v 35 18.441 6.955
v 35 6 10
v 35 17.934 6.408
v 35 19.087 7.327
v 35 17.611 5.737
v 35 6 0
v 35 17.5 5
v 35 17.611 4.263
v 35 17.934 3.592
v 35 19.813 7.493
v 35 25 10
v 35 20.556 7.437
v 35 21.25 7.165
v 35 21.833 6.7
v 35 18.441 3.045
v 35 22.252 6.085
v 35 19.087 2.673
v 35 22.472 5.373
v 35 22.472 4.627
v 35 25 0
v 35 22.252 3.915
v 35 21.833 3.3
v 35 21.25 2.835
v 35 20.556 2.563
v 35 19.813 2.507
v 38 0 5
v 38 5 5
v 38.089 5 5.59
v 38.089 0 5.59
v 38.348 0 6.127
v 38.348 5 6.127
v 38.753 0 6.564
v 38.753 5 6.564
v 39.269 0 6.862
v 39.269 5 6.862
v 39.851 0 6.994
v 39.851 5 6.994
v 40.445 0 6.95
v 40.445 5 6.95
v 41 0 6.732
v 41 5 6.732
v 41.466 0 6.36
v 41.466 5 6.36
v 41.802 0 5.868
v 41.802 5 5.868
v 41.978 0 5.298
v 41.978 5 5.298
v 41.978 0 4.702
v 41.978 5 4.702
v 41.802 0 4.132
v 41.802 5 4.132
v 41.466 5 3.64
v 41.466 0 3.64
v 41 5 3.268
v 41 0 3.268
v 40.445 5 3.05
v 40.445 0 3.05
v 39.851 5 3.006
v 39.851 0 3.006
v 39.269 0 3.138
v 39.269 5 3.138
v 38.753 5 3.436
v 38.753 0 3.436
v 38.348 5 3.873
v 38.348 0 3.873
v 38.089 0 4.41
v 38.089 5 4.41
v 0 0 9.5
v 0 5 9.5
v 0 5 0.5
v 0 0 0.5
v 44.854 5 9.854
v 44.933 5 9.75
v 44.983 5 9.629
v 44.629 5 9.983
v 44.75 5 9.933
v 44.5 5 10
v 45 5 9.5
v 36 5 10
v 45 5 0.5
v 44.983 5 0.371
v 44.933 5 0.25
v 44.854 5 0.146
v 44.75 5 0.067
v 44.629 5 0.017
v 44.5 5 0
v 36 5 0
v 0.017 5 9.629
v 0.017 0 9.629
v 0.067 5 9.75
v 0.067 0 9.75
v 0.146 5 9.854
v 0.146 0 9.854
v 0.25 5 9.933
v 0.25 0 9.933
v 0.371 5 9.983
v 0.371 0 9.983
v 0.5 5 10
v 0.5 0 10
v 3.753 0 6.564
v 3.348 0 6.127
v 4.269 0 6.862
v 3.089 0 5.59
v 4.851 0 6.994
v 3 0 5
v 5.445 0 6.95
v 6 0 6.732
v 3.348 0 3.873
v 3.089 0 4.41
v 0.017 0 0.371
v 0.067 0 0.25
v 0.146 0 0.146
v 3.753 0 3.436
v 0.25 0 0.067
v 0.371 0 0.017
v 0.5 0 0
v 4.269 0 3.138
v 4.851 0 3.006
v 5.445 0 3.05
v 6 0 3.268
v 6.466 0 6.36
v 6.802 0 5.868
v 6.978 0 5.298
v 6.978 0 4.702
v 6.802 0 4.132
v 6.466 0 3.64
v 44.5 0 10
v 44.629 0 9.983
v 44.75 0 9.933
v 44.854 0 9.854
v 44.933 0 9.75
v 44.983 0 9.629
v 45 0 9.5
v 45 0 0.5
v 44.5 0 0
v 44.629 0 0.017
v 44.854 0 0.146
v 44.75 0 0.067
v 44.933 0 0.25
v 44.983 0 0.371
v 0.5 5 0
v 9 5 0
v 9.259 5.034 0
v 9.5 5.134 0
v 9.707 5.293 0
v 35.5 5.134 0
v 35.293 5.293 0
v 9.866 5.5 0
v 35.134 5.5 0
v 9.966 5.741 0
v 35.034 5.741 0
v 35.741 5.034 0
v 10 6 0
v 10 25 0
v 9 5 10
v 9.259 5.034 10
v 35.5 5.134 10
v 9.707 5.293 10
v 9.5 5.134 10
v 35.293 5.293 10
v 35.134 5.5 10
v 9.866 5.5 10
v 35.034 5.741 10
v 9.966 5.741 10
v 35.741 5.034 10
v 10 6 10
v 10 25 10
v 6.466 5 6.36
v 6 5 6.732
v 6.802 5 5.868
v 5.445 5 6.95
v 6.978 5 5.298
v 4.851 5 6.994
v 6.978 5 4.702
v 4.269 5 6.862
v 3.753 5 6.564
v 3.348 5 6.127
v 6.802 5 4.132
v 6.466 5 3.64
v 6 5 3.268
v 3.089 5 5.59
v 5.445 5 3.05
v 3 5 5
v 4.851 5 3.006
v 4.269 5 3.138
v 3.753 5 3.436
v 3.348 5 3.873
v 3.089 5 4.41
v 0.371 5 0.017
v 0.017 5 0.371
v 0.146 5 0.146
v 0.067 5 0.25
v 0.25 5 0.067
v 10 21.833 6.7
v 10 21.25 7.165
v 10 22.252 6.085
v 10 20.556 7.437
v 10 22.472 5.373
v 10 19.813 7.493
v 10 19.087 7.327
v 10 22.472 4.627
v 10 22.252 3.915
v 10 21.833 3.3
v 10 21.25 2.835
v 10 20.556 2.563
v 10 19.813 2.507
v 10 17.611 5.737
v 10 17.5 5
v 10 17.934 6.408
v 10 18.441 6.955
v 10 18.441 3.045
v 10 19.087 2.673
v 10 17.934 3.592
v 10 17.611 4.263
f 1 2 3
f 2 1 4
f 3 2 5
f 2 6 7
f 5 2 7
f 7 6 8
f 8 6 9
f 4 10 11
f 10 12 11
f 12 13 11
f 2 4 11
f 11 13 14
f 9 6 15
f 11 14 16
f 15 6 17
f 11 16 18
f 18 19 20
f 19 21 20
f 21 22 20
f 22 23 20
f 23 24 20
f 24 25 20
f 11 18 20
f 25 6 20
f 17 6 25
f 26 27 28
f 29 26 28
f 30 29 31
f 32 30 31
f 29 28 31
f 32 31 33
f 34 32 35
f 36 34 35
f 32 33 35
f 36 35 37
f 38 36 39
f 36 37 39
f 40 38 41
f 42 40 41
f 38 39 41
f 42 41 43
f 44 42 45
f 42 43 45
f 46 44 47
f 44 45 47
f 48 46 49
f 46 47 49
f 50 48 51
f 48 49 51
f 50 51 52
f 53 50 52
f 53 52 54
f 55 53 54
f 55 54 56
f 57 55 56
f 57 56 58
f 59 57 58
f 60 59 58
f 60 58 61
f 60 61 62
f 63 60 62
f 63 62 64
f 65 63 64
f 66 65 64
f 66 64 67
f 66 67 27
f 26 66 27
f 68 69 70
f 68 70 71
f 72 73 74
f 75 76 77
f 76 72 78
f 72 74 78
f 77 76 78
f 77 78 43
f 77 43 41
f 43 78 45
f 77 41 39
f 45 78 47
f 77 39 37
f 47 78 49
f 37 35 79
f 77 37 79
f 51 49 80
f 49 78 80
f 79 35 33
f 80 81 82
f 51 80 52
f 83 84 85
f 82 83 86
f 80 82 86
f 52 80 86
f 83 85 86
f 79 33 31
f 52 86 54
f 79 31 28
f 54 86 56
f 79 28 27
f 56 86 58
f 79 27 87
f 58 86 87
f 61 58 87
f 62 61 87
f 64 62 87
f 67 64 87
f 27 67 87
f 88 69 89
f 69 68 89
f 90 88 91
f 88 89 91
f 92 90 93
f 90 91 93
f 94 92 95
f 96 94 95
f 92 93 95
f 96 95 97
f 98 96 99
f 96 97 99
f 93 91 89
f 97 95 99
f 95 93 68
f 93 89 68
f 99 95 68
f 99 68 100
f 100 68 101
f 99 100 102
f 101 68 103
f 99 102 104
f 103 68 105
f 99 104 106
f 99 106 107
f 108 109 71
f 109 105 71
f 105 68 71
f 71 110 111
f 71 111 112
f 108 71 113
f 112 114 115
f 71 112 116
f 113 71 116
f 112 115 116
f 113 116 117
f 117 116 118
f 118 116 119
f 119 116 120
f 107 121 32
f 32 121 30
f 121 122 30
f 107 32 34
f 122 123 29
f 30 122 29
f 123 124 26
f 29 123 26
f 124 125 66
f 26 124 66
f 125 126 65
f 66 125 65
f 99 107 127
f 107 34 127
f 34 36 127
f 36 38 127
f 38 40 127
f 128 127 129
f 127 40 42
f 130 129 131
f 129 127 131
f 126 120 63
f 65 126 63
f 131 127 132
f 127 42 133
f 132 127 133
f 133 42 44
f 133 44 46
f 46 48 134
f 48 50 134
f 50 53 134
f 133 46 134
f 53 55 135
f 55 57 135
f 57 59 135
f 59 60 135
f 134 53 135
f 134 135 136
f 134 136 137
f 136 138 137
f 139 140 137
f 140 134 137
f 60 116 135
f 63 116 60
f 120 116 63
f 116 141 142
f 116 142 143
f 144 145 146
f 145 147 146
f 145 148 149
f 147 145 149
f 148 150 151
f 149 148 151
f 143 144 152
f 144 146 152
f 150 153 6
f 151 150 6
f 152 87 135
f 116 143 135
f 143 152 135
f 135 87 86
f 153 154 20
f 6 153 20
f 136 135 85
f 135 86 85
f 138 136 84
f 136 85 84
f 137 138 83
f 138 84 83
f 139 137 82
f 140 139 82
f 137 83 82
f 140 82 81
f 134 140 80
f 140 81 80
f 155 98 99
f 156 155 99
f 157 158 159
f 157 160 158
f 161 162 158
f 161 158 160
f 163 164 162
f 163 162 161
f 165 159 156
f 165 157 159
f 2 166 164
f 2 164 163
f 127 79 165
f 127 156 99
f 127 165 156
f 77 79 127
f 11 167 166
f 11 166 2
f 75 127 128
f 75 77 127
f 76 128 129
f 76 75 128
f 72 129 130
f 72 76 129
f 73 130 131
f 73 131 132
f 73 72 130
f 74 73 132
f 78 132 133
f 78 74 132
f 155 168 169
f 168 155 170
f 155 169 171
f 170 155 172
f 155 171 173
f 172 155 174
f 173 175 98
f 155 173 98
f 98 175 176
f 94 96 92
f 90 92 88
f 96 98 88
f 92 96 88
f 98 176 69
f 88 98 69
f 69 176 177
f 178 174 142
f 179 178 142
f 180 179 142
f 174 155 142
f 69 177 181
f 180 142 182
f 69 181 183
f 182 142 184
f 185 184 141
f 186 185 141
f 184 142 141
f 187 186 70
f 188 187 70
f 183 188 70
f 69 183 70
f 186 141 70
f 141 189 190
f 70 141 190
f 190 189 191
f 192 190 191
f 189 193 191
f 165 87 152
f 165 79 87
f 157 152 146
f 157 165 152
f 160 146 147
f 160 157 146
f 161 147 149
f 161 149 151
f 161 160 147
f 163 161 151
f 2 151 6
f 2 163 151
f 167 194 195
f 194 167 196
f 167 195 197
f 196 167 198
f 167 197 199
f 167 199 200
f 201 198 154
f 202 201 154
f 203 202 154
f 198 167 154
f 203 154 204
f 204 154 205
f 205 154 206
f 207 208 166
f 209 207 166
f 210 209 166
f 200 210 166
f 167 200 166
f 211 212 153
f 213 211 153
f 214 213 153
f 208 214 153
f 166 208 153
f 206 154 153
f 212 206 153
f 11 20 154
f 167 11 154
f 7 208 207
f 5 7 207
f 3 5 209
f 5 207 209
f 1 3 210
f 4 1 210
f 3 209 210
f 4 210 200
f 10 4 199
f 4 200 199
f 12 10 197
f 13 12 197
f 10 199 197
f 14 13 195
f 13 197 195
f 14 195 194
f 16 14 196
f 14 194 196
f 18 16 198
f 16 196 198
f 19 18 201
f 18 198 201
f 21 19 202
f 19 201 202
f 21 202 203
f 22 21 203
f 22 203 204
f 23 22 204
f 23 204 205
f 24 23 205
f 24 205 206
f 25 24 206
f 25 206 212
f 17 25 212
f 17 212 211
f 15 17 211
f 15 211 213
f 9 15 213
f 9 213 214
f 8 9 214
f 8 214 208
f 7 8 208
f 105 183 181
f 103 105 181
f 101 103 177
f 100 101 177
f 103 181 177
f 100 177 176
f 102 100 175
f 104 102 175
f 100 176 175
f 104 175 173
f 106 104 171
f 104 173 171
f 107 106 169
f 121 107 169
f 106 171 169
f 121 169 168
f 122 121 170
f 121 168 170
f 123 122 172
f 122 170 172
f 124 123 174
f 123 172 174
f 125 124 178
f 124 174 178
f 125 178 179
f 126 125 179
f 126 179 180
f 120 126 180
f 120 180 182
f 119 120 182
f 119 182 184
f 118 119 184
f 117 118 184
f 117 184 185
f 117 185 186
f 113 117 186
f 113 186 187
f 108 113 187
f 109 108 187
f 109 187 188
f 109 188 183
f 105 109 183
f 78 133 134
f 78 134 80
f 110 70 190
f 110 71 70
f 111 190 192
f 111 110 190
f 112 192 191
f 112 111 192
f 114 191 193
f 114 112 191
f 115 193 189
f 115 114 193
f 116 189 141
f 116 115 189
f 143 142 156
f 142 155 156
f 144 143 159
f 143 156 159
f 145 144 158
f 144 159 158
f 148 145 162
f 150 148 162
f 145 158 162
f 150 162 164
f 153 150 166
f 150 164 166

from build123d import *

# Parameters (mm, degrees)
F1_DEPTH = 10
F3_D     = 5
F5_D     = 4
F6_R     = 0.5
F7_R     = 1


with BuildPart() as f1:
    # F0 (on Top) → F1 (new body)
    with BuildSketch(Plane.XY):
        Polygon((0, 5), (0, 0), (45, 0), (45, 5), (35, 5), (35, 25), (10, 25), (10, 5), align=None)
    extrude(amount=F1_DEPTH)

    # F3 (through all)
    with Locations(Plane.YZ.offset(35)):
        with Locations((20, 5)):
            Hole(F3_D / 2)

    # F5 (through all)
    with Locations(Plane.XZ):
        with Locations((5, 5), (40, 5)):
            Hole(F5_D / 2)

    # F6
    f6_edges = [f1.edges().sort_by_distance(p)[0] for p in [
        (0, 2.5, 10),
        (0, 2.5, 0),
        (45, 2.5, 10),
        (45, 2.5, 0),
    ]]
    fillet(f6_edges, radius=F6_R)

    # F7
    f7_edges = [f1.edges().sort_by_distance(p)[0] for p in [
        (10, 5, 5),
        (35, 5, 5),
    ]]
    fillet(f7_edges, radius=F7_R)


solid = f1.part
